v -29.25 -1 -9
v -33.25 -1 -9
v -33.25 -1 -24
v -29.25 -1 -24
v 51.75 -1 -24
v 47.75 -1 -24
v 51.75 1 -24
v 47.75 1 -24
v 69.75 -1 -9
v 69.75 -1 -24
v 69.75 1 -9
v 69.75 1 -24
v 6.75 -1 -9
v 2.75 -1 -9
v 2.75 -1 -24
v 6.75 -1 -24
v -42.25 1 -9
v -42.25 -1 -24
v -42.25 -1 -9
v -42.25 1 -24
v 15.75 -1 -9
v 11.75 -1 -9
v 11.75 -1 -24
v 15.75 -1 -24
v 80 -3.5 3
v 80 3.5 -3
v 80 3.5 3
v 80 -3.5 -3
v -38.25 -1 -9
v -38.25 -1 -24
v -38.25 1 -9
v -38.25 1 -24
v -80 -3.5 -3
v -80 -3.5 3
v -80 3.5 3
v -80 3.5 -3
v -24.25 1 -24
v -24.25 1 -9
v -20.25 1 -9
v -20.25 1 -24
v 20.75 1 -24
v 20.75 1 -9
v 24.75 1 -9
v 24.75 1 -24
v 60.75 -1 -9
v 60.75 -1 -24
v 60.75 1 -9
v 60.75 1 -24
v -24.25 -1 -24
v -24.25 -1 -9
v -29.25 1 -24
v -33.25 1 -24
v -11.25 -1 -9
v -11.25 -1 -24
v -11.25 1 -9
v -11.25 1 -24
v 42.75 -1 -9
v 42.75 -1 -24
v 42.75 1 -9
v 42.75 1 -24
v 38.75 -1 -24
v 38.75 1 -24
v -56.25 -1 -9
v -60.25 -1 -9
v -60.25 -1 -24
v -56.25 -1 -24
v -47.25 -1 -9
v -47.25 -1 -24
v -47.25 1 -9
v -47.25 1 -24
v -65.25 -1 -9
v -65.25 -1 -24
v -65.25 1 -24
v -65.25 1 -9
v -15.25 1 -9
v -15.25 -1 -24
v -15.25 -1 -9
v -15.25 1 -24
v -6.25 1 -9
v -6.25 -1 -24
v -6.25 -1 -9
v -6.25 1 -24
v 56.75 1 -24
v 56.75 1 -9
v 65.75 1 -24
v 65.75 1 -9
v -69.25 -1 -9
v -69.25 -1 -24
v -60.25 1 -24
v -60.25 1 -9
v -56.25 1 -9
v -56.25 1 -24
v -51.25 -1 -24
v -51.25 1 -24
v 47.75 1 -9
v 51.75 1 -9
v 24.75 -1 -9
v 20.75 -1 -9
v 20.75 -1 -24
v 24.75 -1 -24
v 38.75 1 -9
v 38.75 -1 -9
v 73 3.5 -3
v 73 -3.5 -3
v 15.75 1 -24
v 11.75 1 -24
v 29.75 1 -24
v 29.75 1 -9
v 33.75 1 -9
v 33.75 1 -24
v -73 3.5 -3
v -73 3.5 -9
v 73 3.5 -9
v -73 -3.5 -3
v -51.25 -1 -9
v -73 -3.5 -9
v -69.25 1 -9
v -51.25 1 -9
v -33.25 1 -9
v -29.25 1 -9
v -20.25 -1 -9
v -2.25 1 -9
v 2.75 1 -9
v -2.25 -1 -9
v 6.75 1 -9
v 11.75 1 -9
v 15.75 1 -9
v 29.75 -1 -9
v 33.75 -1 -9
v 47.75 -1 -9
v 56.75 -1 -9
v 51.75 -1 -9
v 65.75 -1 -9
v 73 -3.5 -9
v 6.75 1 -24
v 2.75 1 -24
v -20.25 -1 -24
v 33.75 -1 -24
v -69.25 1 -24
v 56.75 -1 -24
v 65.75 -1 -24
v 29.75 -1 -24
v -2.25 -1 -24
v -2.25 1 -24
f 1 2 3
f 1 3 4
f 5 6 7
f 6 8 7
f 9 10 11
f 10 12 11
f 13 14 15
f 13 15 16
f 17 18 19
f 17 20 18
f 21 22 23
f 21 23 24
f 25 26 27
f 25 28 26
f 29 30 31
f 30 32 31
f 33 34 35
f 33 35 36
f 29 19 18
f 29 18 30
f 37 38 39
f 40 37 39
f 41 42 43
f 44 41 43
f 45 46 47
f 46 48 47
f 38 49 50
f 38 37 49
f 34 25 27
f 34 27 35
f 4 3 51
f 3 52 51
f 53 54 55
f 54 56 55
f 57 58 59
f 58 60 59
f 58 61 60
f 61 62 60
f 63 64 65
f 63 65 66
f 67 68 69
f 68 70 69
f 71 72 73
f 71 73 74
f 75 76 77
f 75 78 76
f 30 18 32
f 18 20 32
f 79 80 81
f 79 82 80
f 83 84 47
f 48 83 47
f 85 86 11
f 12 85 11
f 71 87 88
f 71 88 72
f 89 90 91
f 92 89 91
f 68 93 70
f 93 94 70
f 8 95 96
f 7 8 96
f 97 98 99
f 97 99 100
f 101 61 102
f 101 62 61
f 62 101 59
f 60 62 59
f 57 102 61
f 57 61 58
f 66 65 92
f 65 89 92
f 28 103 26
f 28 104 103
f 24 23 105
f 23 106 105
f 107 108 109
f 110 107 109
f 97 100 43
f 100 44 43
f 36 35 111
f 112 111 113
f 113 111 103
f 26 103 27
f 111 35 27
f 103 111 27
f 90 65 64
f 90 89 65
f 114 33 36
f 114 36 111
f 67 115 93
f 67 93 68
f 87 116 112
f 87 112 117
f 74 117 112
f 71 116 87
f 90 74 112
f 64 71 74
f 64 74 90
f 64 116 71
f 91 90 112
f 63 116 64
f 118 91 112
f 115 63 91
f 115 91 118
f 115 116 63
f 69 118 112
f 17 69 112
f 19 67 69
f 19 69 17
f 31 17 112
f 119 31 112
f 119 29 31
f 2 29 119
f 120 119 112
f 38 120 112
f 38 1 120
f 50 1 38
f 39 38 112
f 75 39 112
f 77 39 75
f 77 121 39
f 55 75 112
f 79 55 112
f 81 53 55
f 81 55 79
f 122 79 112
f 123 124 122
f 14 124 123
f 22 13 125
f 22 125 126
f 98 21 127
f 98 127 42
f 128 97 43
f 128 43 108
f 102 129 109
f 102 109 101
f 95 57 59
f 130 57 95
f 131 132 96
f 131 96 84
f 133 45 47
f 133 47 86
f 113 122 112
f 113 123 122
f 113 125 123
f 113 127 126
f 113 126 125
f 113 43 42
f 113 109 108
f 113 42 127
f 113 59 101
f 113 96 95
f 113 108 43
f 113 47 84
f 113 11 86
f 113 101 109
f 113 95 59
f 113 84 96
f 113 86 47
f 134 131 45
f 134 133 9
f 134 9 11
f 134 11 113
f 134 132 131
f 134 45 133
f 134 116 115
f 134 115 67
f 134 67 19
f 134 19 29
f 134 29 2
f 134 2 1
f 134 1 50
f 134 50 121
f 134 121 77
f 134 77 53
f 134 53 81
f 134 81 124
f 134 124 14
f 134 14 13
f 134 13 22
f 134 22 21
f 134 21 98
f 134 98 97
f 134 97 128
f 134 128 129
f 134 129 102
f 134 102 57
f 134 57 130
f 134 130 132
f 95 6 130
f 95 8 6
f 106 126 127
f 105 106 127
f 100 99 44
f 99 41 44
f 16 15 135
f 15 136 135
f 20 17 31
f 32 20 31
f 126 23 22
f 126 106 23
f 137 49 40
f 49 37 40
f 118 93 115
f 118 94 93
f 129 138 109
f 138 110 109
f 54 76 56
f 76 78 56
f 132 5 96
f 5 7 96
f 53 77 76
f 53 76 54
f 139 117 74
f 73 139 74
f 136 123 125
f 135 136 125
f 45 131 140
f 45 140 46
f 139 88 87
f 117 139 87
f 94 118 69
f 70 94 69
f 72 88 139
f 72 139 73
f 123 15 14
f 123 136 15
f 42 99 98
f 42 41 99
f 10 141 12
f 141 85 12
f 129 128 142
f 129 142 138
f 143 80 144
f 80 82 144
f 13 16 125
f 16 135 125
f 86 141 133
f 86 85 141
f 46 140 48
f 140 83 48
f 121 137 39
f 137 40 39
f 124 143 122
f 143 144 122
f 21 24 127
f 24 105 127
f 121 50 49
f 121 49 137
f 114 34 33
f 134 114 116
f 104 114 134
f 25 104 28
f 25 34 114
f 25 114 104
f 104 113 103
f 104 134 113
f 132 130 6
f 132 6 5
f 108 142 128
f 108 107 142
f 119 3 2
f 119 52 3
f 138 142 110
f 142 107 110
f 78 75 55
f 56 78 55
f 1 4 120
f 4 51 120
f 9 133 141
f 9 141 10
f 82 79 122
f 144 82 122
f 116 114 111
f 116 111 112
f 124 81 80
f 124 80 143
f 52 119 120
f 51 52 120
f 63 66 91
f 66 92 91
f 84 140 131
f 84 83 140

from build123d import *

# Parameters (mm, degrees)
F1_DEPTH = 3.5
F0_W     = 4
F0_H     = 15
F2_DEPTH = 1


with BuildPart() as f1:
    # F0 (on Front) → F1 (new body, symmetric)
    with BuildSketch(Plane.XZ):
        Polygon((80, -3), (80, 3), (-80, 3), (-80, -3), (-73, -3), (73, -3), align=None)
        Polygon((73, -9), (73, -3), (-73, -3), (-73, -9), (-69.25, -9), (-65.25, -9), (-60.25, -9), (-56.25, -9), (-51.25, -9), (-47.25, -9), (-42.25, -9), (-38.25, -9), (-33.25, -9), (-29.25, -9), (-24.25, -9), (-20.25, -9), (-15.25, -9), (-11.25, -9), (-6.25, -9), (-2.25, -9), (2.75, -9), (6.75, -9), (11.75, -9), (15.75, -9), (20.75, -9), (24.75, -9), (29.75, -9), (33.75, -9), (38.75, -9), (42.75, -9), (47.75, -9), (51.75, -9), (56.75, -9), (60.75, -9), (65.75, -9), (69.75, -9), align=None)
    extrude(amount=F1_DEPTH, both=True)

    # F0 (on Front) → F2 (join, symmetric)
    with BuildSketch(Plane.XZ):
        with Locations((67.75, -16.5)):
            Rectangle(F0_W, F0_H)
        with Locations((58.75, -16.5)):
            Rectangle(F0_W, F0_H)
        with Locations((49.75, -16.5)):
            Rectangle(F0_W, F0_H)
        with Locations((40.75, -16.5)):
            Rectangle(F0_W, F0_H)
        with Locations((31.75, -16.5)):
            Rectangle(F0_W, F0_H)
        with Locations((22.75, -16.5)):
            Rectangle(F0_W, F0_H)
        with Locations((13.75, -16.5)):
            Rectangle(F0_W, F0_H)
        with Locations((4.75, -16.5)):
            Rectangle(F0_W, F0_H)
        with Locations((-4.25, -16.5)):
            Rectangle(F0_W, F0_H)
        with Locations((-13.25, -16.5)):
            Rectangle(F0_W, F0_H)
        with Locations((-22.25, -16.5)):
            Rectangle(F0_W, F0_H)
        with Locations((-31.25, -16.5)):
            Rectangle(F0_W, F0_H)
        with Locations((-40.25, -16.5)):
            Rectangle(F0_W, F0_H)
        with Locations((-49.25, -16.5)):
            Rectangle(F0_W, F0_H)
        with Locations((-58.25, -16.5)):
            Rectangle(F0_W, F0_H)
        with Locations((-67.25, -16.5)):
            Rectangle(F0_W, F0_H)
    extrude(amount=F2_DEPTH, both=True)


solid = f1.part
